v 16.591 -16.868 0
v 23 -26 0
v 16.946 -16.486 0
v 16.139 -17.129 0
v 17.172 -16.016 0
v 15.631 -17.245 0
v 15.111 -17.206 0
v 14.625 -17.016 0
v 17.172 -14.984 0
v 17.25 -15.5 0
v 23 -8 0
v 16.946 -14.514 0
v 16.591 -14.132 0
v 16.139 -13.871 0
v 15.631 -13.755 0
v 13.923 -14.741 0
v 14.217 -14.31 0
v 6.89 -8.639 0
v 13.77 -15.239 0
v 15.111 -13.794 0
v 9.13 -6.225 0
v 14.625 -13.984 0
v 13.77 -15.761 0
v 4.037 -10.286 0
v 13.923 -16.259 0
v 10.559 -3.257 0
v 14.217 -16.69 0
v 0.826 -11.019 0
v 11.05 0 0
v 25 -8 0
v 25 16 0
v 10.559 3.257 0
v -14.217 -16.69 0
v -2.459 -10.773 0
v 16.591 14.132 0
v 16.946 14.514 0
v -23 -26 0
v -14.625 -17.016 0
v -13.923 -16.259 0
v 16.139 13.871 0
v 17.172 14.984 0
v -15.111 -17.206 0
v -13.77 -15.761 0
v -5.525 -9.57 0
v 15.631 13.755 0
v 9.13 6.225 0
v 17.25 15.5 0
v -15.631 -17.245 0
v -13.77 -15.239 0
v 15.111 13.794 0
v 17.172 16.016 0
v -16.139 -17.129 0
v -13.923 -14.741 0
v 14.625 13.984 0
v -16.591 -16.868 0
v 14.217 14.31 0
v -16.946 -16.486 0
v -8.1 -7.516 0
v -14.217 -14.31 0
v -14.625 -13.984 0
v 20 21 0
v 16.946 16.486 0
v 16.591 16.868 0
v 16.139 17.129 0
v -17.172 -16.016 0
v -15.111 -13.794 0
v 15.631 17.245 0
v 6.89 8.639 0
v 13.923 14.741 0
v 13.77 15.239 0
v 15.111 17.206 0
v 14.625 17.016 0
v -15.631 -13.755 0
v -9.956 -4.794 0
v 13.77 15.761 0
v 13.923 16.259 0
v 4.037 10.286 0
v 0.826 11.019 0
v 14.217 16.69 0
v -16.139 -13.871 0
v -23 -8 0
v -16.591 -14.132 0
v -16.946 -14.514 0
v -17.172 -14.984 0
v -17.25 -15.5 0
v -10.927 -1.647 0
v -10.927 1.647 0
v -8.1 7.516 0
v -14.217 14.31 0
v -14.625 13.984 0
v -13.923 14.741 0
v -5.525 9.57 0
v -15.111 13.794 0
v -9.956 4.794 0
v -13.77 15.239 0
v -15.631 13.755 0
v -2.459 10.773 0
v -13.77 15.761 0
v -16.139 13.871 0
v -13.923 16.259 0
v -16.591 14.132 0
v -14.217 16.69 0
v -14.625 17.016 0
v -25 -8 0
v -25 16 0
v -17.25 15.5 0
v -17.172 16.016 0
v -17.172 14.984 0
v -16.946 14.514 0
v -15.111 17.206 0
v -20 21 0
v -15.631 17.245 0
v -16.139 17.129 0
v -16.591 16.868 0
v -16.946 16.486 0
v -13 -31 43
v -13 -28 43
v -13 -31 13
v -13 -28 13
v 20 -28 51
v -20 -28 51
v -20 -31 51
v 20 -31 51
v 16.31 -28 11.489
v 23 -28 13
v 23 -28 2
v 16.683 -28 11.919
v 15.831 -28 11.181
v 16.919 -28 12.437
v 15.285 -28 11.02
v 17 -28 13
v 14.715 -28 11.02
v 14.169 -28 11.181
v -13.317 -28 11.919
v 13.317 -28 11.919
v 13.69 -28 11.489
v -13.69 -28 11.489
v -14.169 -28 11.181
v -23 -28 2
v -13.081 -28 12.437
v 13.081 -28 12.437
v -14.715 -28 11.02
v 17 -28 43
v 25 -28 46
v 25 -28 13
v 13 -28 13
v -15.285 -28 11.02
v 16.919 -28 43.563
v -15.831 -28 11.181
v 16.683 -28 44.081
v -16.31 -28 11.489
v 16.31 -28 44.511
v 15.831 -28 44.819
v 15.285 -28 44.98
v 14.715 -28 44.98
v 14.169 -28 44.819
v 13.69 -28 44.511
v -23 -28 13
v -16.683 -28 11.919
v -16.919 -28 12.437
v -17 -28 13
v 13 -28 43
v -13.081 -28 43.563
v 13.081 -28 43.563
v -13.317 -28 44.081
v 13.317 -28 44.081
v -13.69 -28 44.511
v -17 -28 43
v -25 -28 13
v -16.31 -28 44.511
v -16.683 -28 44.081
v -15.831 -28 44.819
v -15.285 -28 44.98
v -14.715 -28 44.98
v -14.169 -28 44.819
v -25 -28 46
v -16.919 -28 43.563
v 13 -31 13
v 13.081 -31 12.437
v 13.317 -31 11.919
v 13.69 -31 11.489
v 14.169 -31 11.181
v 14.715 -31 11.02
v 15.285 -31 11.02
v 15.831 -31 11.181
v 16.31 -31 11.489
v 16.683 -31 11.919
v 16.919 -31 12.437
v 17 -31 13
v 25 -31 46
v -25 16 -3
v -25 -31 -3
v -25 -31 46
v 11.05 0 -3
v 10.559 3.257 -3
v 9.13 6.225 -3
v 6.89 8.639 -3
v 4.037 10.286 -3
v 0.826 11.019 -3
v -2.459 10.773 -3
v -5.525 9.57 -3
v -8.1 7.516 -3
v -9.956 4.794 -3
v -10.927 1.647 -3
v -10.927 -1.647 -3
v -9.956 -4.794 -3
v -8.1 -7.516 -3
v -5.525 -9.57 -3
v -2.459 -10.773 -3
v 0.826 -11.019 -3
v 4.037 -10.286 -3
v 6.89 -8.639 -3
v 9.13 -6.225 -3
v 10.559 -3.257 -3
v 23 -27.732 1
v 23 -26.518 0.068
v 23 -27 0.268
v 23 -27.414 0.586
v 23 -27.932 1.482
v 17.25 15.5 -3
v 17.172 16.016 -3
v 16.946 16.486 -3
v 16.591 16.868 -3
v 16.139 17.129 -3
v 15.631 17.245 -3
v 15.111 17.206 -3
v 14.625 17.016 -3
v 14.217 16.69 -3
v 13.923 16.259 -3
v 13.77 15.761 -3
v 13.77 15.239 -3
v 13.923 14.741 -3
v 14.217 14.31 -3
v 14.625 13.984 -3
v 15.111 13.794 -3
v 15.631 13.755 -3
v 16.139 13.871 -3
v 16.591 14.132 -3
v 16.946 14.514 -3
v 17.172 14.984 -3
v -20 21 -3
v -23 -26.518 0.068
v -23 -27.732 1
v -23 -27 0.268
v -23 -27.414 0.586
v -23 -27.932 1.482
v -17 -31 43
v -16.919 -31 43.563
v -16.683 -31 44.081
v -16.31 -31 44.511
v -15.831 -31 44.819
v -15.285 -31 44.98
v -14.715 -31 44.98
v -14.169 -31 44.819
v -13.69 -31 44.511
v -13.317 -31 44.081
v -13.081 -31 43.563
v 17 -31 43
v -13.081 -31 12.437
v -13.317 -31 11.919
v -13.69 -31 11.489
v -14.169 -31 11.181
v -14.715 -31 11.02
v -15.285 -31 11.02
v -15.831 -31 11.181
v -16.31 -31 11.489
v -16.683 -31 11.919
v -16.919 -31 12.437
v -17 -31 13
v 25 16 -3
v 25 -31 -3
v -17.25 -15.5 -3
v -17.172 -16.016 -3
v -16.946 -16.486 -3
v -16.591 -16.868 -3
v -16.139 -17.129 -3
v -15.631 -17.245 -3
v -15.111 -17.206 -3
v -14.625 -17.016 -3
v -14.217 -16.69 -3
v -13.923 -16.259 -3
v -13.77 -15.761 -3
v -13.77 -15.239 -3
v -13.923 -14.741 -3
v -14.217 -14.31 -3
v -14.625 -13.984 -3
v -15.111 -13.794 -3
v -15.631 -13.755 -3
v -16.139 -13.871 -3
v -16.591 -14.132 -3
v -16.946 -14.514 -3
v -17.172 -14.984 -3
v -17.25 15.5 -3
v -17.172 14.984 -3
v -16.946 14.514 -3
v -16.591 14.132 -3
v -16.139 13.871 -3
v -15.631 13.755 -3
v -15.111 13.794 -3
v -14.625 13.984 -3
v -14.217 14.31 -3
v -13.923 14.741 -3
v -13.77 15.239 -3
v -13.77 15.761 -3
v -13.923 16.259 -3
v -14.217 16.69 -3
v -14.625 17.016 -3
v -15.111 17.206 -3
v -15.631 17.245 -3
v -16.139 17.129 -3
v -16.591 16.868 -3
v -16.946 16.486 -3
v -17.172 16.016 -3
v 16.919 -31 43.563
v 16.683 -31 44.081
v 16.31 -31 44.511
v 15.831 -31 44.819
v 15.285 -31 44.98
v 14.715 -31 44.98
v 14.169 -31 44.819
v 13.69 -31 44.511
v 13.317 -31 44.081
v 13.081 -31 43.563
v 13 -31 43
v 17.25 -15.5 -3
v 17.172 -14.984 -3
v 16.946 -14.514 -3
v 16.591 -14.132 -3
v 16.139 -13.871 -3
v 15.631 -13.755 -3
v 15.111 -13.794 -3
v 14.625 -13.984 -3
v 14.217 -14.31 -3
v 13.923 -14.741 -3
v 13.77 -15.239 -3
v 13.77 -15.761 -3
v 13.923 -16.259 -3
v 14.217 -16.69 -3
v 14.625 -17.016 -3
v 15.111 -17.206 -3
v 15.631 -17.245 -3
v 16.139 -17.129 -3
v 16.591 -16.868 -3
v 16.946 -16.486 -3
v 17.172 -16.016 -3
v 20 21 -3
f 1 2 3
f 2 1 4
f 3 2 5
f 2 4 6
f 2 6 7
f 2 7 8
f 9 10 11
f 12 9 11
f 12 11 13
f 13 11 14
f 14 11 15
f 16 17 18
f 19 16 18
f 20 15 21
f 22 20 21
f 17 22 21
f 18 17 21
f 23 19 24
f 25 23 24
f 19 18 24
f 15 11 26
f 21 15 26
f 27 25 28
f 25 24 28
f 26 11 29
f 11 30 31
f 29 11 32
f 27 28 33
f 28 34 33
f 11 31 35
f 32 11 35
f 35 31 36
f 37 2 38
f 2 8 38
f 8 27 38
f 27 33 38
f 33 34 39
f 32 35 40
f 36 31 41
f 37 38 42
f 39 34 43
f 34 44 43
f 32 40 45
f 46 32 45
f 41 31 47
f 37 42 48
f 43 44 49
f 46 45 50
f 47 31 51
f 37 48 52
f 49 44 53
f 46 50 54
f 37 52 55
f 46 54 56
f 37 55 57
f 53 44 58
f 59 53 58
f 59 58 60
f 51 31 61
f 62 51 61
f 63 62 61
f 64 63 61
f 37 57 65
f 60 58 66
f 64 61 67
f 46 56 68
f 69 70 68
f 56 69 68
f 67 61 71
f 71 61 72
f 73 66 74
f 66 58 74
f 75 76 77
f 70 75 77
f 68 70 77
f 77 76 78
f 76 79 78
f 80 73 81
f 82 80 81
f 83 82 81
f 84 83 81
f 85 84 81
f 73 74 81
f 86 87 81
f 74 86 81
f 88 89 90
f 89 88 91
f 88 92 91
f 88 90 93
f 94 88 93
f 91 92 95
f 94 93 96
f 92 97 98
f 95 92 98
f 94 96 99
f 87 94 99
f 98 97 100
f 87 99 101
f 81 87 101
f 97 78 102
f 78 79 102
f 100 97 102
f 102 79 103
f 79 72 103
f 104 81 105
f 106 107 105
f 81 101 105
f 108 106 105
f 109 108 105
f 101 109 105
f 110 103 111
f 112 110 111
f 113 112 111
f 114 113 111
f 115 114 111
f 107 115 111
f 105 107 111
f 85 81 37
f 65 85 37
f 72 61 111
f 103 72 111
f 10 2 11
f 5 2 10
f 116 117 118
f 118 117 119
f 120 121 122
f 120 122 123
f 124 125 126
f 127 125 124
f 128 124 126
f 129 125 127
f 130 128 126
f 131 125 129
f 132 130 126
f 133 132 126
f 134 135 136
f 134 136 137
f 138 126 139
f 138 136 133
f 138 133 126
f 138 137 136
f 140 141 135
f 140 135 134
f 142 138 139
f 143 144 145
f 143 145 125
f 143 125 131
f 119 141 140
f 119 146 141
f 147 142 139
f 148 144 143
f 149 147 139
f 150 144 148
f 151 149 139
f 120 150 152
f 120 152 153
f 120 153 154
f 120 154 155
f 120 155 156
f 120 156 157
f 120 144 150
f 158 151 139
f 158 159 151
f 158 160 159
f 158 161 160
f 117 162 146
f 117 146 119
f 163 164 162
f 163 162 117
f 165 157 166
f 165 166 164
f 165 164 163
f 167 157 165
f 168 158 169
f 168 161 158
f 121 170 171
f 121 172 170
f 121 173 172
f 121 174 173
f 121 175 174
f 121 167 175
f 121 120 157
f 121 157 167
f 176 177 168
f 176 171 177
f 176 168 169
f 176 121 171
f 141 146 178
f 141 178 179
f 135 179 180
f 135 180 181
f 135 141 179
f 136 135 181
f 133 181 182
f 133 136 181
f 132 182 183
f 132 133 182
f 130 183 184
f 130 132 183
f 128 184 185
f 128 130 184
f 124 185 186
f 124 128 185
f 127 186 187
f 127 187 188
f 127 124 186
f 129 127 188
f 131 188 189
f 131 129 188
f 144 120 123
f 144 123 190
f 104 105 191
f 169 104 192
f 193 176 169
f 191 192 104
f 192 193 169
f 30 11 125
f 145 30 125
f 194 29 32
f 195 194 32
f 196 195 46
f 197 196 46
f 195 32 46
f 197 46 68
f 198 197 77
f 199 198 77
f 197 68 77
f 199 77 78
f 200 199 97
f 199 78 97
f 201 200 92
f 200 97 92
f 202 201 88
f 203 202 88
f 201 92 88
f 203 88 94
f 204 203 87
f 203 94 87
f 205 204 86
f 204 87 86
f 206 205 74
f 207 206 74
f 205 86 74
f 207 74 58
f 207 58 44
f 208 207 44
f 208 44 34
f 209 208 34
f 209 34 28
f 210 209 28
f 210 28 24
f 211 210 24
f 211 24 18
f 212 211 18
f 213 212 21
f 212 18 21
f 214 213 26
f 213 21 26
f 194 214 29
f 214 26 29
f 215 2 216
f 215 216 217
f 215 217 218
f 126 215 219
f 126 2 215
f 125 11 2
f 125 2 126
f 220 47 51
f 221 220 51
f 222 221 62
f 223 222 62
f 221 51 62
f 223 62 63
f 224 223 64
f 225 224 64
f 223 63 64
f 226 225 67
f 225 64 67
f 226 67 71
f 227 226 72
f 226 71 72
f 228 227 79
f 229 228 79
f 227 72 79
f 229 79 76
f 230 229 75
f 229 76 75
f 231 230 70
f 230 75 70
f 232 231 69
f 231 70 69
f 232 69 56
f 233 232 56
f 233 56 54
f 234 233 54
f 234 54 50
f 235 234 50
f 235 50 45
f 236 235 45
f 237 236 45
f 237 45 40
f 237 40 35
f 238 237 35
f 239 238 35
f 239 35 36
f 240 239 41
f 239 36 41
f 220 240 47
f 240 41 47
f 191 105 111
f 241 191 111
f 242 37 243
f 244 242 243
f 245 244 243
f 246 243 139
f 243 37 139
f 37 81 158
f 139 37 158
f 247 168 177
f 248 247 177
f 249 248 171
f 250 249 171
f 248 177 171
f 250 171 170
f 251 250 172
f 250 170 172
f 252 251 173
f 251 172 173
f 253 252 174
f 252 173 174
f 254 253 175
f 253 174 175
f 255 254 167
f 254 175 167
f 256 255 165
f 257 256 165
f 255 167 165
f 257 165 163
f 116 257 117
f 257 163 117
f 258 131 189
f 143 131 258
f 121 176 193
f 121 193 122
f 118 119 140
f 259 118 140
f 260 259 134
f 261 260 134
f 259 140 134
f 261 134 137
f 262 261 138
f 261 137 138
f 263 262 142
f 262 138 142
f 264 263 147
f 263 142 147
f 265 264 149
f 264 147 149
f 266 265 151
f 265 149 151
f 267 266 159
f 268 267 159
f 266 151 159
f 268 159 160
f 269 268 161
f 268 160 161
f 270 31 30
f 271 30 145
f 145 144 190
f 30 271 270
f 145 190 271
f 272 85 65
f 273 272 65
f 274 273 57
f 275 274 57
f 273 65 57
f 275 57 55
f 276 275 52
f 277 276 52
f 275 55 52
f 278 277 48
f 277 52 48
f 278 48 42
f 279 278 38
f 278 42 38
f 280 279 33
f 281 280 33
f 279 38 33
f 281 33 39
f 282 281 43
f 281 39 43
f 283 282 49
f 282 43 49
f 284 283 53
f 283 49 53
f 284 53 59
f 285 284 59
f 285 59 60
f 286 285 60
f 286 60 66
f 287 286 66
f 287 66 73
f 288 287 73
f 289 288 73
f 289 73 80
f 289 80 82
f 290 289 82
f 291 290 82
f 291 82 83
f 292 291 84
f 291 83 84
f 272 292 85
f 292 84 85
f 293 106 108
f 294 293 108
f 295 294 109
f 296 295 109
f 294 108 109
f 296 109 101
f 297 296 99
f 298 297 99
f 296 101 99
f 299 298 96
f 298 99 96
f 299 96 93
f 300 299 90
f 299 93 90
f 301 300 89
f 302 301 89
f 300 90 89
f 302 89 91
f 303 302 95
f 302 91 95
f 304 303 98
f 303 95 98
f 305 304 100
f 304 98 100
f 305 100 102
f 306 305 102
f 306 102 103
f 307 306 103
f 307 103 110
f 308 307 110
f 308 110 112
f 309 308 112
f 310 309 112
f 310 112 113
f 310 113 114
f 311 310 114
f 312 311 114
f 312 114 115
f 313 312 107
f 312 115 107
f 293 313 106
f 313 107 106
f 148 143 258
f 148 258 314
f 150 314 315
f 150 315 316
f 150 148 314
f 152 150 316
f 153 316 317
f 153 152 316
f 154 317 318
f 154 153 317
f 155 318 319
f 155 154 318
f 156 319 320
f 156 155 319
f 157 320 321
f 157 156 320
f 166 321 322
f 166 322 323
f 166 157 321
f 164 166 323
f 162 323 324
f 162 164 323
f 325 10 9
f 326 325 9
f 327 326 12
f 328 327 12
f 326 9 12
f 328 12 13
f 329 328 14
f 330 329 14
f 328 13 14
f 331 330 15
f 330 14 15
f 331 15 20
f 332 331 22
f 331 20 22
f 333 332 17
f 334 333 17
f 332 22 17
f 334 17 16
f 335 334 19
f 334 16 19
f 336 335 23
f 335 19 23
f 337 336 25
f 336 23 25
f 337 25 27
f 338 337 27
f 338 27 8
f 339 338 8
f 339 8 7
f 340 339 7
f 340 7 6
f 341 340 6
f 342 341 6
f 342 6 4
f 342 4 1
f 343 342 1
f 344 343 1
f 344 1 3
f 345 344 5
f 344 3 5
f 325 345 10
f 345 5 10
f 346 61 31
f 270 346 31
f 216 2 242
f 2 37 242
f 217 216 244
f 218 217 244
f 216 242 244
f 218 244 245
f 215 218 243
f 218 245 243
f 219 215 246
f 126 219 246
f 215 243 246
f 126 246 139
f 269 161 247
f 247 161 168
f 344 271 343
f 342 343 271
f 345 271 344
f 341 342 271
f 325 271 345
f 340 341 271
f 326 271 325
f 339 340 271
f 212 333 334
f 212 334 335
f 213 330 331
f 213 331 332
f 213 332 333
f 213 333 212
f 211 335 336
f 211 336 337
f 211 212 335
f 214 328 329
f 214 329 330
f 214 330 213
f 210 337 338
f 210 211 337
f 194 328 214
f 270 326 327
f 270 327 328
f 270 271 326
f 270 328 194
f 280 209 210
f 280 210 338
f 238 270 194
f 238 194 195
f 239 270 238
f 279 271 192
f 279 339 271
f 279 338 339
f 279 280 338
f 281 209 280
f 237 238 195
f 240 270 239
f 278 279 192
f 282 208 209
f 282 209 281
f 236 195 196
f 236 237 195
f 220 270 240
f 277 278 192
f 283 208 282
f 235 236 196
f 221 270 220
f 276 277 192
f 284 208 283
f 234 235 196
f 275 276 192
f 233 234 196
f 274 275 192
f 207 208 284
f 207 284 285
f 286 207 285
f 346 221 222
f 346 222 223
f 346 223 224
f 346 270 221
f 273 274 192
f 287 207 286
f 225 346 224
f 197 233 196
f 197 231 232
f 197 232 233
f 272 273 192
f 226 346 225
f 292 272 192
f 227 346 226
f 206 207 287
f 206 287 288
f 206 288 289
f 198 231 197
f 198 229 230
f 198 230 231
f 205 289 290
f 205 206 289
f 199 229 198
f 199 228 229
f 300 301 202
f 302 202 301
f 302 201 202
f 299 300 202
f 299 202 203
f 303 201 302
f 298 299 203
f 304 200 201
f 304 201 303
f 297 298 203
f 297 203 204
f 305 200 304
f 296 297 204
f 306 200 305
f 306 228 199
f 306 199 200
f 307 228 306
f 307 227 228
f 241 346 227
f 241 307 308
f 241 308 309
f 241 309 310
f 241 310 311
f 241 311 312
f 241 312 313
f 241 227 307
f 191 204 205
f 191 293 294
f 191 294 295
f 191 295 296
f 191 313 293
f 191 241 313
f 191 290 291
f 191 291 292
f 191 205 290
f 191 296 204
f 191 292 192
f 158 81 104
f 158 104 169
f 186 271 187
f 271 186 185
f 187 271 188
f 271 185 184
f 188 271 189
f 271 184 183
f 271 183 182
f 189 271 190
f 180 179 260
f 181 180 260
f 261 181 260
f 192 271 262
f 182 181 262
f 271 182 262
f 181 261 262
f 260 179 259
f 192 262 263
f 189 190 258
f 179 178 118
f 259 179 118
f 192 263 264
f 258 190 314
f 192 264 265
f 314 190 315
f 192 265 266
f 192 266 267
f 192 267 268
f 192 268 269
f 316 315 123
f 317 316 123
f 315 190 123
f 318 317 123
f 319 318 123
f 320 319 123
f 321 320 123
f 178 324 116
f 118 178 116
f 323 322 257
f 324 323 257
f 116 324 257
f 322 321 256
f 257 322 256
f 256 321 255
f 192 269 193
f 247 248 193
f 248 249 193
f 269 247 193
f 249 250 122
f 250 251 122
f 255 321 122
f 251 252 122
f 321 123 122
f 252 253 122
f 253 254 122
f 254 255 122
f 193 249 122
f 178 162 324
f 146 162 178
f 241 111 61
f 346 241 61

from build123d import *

# Parameters (mm, degrees)
SKETCH_1_R      = 11.05
SKETCH_1_R_2    = 1.75
EXTRUDE_1_DEPTH = 3
EXTRUDE_2_DEPTH = 3
RIB_1_REACH     = 79.859
SKETCH_3_WALL_W = 181.571414162
SKETCH_3_WALL_H = 2
FILLET_1_R      = 2


with BuildPart() as part:
    # 草图1 → 凸台-拉伸1 (new body)
    with BuildSketch(Plane.XY):
        Polygon((-20, 21), (20, 21), (25, 16), (25, -28), (-25, -28), (-25, 16), align=None)
        Circle(SKETCH_1_R, mode=Mode.SUBTRACT)
        with Locations((15.5, 15.5)):
            Circle(SKETCH_1_R_2, mode=Mode.SUBTRACT)
        with Locations((15.5, -15.5)):
            Circle(SKETCH_1_R_2, mode=Mode.SUBTRACT)
        with Locations(Location((-15.5, -15.5, 0), (0, 0, 180))):
            Circle(SKETCH_1_R_2, mode=Mode.SUBTRACT)
        with Locations(Location((-15.5, 15.5, 0), (0, 0, 180))):
            Circle(SKETCH_1_R_2, mode=Mode.SUBTRACT)
    extrude(amount=-EXTRUDE_1_DEPTH)

    # 草图2 → 凸台-拉伸2 (add)
    with BuildSketch(Plane.XZ.offset(28)):
        Polygon((-25, -3), (-25, 46), (-20, 51), (20, 51), (25, 46), (25, -3), align=None)
        with BuildLine():
            Line((-13, 43), (-13, 13))
            ThreePointArc((-13, 13), (-15, 11), (-17, 13))
            Line((-17, 13), (-17, 43))
            ThreePointArc((-17, 43), (-15, 45), (-13, 43))
        make_face(mode=Mode.SUBTRACT)
        with BuildLine():
            Line((13, 43), (13, 13))
            ThreePointArc((13, 13), (15, 11), (17, 13))
            Line((17, 13), (17, 43))
            ThreePointArc((17, 43), (15, 45), (13, 43))
        make_face(mode=Mode.SUBTRACT)
    extrude(amount=EXTRUDE_2_DEPTH)

    # 草图3 wall → 筋1 (add, up to next)
    with BuildSketch(Plane(origin=(-25, -18, 6.5), x_dir=(0, -0.838443616301, 0.544988350595), z_dir=(0, 0.544988350595, 0.838443616301)), mode=Mode.PRIVATE) as rib_1_sk1:
        with Locations((0, 1)):
            Rectangle(SKETCH_3_WALL_W, SKETCH_3_WALL_H)
    rib_1_tool1 = extrude(rib_1_sk1.sketch, amount=-RIB_1_REACH, mode=Mode.PRIVATE) - part.part
    rib_1 = rib_1_tool1.solids().sort_by_distance((-25, -18, 6.5))[0]
    add(rib_1)

    # 镜向1: 筋1 across plane
    add(rib_1.mirror(Plane(origin=(0, 0, 0), x_dir=(0, 0, 1), z_dir=(1, 0, 0))))

    # 圆角1
    fillet_1_edges = [part.edges().sort_by_distance(p)[0] for p in [
        (0, -28, 0),
    ]]
    fillet(fillet_1_edges, radius=FILLET_1_R)


solid = part.part
